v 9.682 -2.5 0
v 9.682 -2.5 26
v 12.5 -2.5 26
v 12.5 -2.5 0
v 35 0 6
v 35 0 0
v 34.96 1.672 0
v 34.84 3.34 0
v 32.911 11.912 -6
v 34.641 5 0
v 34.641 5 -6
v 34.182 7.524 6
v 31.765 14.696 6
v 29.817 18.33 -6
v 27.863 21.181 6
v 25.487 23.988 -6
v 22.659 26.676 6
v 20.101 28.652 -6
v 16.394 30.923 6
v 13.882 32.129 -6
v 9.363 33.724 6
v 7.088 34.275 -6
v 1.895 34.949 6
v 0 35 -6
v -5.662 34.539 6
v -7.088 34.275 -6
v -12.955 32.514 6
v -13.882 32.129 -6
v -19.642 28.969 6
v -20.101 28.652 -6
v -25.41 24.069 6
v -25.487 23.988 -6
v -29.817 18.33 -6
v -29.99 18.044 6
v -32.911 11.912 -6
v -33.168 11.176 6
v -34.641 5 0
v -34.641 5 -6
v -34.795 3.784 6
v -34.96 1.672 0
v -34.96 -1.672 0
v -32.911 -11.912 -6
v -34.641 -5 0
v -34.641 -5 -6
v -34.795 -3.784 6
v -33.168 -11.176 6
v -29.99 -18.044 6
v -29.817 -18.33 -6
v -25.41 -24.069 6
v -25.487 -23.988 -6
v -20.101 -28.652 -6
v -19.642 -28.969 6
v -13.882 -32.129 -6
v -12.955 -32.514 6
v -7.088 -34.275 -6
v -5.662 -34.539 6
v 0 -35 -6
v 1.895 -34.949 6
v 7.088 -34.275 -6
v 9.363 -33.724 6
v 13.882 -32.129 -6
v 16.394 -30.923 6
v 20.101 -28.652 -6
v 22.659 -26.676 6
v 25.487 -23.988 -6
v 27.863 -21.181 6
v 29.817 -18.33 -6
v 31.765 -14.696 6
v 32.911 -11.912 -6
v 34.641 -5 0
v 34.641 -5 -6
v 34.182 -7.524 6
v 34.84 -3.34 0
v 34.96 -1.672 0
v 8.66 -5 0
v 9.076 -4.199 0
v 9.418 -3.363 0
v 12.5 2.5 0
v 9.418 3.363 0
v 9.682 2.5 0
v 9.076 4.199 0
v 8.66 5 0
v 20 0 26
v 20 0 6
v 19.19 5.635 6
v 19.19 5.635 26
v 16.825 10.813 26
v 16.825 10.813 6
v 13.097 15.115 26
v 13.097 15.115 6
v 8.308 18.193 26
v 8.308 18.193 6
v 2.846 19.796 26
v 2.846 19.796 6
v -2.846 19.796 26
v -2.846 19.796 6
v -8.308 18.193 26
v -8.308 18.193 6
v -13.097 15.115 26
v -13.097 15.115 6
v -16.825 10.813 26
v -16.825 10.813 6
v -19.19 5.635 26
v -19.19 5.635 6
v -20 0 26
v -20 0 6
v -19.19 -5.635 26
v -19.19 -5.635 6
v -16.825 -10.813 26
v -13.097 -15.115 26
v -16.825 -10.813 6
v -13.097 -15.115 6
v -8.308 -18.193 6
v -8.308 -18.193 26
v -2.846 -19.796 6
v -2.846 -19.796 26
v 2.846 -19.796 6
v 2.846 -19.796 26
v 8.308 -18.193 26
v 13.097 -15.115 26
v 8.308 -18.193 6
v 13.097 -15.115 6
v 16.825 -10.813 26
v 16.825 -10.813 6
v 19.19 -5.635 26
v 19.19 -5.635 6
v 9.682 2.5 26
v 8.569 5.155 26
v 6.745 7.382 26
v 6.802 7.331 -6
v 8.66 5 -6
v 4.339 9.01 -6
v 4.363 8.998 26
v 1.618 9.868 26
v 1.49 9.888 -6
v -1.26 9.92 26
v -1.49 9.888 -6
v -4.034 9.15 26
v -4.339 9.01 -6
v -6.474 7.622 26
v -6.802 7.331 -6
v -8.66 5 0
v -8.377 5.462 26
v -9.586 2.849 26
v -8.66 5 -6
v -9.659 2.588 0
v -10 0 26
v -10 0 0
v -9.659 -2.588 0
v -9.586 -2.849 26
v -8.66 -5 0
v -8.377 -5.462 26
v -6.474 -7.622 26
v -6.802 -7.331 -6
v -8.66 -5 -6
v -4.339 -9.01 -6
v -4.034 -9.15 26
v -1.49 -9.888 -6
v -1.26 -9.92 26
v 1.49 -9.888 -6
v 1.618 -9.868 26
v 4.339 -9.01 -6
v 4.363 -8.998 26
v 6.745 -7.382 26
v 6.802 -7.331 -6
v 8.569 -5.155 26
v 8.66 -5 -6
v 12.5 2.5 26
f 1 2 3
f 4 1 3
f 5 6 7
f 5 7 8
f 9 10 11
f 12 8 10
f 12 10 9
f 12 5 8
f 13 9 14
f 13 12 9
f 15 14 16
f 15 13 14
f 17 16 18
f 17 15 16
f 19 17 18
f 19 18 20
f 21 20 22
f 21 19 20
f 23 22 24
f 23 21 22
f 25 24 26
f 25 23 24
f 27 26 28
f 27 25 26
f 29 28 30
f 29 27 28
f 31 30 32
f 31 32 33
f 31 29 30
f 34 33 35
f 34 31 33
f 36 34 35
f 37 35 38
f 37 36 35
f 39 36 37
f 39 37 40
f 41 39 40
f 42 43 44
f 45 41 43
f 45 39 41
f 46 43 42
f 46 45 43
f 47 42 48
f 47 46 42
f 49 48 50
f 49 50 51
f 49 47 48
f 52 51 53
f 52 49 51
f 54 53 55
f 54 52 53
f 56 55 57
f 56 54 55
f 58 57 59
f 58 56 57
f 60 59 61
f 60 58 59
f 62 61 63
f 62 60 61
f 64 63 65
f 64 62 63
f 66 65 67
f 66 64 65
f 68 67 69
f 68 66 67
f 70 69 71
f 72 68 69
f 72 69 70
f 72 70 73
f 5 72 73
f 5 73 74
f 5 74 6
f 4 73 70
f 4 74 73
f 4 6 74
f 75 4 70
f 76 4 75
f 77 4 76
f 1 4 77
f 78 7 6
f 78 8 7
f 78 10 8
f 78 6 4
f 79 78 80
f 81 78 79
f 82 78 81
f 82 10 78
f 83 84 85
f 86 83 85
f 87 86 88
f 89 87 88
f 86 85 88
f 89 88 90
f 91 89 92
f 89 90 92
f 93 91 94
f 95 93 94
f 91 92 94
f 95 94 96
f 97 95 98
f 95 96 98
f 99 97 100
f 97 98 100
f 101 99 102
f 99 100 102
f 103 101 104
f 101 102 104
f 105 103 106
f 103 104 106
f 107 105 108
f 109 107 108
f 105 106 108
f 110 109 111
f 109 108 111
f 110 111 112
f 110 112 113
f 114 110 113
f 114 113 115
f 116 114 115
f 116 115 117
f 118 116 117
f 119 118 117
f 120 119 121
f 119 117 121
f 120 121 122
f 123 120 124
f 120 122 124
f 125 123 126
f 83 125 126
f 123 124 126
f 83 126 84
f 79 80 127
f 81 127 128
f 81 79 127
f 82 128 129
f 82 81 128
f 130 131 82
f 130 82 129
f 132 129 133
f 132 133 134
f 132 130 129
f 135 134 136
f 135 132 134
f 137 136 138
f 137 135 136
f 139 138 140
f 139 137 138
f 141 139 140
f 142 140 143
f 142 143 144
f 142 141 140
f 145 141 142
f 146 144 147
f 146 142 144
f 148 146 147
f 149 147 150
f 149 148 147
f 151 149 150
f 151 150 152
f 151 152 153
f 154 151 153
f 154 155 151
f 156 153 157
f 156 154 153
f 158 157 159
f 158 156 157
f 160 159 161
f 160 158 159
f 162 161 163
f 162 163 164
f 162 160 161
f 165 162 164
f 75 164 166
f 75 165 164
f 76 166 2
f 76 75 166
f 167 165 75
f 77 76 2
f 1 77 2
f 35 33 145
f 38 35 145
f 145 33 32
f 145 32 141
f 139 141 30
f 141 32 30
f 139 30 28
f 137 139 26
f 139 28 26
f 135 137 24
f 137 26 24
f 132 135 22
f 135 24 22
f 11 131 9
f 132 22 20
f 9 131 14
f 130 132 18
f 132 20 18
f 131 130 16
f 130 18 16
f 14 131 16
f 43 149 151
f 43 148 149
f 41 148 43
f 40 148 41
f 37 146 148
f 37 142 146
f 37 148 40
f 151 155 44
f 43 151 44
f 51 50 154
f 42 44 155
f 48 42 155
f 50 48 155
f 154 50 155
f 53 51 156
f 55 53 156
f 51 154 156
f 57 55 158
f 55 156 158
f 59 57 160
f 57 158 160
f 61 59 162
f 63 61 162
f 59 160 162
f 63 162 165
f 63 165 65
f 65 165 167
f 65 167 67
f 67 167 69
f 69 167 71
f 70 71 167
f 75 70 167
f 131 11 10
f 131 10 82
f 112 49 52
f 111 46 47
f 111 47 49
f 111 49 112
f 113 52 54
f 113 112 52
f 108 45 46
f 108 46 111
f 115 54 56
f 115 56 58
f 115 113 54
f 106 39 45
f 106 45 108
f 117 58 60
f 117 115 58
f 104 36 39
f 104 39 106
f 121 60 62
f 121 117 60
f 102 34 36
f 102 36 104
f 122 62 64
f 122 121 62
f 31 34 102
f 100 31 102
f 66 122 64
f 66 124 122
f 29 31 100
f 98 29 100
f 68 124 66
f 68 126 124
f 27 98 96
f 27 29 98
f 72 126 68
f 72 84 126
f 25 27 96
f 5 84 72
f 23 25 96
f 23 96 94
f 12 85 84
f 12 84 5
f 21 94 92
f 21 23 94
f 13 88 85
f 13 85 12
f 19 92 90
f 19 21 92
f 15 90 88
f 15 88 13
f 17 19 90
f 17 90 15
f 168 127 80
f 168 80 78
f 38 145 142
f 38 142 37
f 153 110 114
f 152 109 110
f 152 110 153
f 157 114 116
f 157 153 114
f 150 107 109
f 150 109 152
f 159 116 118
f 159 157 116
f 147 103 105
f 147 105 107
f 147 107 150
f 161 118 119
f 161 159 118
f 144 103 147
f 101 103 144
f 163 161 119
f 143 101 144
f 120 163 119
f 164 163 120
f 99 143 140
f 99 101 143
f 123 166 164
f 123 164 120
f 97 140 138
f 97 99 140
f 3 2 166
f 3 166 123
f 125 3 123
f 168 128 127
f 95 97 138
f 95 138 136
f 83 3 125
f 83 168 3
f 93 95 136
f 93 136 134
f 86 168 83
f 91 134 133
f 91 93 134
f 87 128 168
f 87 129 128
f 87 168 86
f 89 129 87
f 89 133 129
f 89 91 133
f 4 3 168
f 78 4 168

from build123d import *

# Parameters (mm, degrees)
SKETCH1_R           = 35
BOSS_EXTRUDE1_DEPTH = 6
SKETCH2_R           = 20
SKETCH2_R_2         = 10
BOSS_EXTRUDE2_DEPTH = 20
CUT_EXTRUDE1_START  = -20
SKETCH3_R           = 10
CUT_EXTRUDE1_DEPTH  = 20
SKETCH4_W           = 5
SKETCH4_H           = 5
CUT_EXTRUDE2_DEPTH  = 59.940648113
SKETCH5_W           = 82.032874524
SKETCH5_H           = 10
CUT_EXTRUDE3_DEPTH  = 6


with BuildPart() as part:
    # Sketch1 → Boss-Extrude1 (new, symmetric)
    with BuildSketch(Plane.XY):
        Circle(SKETCH1_R)
    extrude(amount=BOSS_EXTRUDE1_DEPTH, both=True)

    # Sketch2 → Boss-Extrude2 (add)
    with BuildSketch(Plane.XY.offset(6)):
        Circle(SKETCH2_R)
        Circle(SKETCH2_R_2, mode=Mode.SUBTRACT)
    extrude(amount=BOSS_EXTRUDE2_DEPTH)

    # Sketch3 → Cut-Extrude1 (cut)
    with BuildSketch(Plane.XY.offset(6).offset(CUT_EXTRUDE1_START)):
        Circle(SKETCH3_R)
    extrude(amount=CUT_EXTRUDE1_DEPTH, mode=Mode.SUBTRACT)

    # Sketch4 → Cut-Extrude2 (cut, through all)
    with BuildSketch(Plane.XY.offset(26)):
        with Locations((10, 0)):
            Rectangle(SKETCH4_W, SKETCH4_H)
    extrude(amount=-CUT_EXTRUDE2_DEPTH, mode=Mode.SUBTRACT)

    # Sketch5 → Cut-Extrude3 (cut)
    with BuildSketch(Plane(origin=(0, 0, -6), x_dir=(-1, 0, 0), z_dir=(0, 0, -1))):
        Rectangle(SKETCH5_W, SKETCH5_H)
    extrude(amount=-CUT_EXTRUDE3_DEPTH, mode=Mode.SUBTRACT)


solid = part.part
